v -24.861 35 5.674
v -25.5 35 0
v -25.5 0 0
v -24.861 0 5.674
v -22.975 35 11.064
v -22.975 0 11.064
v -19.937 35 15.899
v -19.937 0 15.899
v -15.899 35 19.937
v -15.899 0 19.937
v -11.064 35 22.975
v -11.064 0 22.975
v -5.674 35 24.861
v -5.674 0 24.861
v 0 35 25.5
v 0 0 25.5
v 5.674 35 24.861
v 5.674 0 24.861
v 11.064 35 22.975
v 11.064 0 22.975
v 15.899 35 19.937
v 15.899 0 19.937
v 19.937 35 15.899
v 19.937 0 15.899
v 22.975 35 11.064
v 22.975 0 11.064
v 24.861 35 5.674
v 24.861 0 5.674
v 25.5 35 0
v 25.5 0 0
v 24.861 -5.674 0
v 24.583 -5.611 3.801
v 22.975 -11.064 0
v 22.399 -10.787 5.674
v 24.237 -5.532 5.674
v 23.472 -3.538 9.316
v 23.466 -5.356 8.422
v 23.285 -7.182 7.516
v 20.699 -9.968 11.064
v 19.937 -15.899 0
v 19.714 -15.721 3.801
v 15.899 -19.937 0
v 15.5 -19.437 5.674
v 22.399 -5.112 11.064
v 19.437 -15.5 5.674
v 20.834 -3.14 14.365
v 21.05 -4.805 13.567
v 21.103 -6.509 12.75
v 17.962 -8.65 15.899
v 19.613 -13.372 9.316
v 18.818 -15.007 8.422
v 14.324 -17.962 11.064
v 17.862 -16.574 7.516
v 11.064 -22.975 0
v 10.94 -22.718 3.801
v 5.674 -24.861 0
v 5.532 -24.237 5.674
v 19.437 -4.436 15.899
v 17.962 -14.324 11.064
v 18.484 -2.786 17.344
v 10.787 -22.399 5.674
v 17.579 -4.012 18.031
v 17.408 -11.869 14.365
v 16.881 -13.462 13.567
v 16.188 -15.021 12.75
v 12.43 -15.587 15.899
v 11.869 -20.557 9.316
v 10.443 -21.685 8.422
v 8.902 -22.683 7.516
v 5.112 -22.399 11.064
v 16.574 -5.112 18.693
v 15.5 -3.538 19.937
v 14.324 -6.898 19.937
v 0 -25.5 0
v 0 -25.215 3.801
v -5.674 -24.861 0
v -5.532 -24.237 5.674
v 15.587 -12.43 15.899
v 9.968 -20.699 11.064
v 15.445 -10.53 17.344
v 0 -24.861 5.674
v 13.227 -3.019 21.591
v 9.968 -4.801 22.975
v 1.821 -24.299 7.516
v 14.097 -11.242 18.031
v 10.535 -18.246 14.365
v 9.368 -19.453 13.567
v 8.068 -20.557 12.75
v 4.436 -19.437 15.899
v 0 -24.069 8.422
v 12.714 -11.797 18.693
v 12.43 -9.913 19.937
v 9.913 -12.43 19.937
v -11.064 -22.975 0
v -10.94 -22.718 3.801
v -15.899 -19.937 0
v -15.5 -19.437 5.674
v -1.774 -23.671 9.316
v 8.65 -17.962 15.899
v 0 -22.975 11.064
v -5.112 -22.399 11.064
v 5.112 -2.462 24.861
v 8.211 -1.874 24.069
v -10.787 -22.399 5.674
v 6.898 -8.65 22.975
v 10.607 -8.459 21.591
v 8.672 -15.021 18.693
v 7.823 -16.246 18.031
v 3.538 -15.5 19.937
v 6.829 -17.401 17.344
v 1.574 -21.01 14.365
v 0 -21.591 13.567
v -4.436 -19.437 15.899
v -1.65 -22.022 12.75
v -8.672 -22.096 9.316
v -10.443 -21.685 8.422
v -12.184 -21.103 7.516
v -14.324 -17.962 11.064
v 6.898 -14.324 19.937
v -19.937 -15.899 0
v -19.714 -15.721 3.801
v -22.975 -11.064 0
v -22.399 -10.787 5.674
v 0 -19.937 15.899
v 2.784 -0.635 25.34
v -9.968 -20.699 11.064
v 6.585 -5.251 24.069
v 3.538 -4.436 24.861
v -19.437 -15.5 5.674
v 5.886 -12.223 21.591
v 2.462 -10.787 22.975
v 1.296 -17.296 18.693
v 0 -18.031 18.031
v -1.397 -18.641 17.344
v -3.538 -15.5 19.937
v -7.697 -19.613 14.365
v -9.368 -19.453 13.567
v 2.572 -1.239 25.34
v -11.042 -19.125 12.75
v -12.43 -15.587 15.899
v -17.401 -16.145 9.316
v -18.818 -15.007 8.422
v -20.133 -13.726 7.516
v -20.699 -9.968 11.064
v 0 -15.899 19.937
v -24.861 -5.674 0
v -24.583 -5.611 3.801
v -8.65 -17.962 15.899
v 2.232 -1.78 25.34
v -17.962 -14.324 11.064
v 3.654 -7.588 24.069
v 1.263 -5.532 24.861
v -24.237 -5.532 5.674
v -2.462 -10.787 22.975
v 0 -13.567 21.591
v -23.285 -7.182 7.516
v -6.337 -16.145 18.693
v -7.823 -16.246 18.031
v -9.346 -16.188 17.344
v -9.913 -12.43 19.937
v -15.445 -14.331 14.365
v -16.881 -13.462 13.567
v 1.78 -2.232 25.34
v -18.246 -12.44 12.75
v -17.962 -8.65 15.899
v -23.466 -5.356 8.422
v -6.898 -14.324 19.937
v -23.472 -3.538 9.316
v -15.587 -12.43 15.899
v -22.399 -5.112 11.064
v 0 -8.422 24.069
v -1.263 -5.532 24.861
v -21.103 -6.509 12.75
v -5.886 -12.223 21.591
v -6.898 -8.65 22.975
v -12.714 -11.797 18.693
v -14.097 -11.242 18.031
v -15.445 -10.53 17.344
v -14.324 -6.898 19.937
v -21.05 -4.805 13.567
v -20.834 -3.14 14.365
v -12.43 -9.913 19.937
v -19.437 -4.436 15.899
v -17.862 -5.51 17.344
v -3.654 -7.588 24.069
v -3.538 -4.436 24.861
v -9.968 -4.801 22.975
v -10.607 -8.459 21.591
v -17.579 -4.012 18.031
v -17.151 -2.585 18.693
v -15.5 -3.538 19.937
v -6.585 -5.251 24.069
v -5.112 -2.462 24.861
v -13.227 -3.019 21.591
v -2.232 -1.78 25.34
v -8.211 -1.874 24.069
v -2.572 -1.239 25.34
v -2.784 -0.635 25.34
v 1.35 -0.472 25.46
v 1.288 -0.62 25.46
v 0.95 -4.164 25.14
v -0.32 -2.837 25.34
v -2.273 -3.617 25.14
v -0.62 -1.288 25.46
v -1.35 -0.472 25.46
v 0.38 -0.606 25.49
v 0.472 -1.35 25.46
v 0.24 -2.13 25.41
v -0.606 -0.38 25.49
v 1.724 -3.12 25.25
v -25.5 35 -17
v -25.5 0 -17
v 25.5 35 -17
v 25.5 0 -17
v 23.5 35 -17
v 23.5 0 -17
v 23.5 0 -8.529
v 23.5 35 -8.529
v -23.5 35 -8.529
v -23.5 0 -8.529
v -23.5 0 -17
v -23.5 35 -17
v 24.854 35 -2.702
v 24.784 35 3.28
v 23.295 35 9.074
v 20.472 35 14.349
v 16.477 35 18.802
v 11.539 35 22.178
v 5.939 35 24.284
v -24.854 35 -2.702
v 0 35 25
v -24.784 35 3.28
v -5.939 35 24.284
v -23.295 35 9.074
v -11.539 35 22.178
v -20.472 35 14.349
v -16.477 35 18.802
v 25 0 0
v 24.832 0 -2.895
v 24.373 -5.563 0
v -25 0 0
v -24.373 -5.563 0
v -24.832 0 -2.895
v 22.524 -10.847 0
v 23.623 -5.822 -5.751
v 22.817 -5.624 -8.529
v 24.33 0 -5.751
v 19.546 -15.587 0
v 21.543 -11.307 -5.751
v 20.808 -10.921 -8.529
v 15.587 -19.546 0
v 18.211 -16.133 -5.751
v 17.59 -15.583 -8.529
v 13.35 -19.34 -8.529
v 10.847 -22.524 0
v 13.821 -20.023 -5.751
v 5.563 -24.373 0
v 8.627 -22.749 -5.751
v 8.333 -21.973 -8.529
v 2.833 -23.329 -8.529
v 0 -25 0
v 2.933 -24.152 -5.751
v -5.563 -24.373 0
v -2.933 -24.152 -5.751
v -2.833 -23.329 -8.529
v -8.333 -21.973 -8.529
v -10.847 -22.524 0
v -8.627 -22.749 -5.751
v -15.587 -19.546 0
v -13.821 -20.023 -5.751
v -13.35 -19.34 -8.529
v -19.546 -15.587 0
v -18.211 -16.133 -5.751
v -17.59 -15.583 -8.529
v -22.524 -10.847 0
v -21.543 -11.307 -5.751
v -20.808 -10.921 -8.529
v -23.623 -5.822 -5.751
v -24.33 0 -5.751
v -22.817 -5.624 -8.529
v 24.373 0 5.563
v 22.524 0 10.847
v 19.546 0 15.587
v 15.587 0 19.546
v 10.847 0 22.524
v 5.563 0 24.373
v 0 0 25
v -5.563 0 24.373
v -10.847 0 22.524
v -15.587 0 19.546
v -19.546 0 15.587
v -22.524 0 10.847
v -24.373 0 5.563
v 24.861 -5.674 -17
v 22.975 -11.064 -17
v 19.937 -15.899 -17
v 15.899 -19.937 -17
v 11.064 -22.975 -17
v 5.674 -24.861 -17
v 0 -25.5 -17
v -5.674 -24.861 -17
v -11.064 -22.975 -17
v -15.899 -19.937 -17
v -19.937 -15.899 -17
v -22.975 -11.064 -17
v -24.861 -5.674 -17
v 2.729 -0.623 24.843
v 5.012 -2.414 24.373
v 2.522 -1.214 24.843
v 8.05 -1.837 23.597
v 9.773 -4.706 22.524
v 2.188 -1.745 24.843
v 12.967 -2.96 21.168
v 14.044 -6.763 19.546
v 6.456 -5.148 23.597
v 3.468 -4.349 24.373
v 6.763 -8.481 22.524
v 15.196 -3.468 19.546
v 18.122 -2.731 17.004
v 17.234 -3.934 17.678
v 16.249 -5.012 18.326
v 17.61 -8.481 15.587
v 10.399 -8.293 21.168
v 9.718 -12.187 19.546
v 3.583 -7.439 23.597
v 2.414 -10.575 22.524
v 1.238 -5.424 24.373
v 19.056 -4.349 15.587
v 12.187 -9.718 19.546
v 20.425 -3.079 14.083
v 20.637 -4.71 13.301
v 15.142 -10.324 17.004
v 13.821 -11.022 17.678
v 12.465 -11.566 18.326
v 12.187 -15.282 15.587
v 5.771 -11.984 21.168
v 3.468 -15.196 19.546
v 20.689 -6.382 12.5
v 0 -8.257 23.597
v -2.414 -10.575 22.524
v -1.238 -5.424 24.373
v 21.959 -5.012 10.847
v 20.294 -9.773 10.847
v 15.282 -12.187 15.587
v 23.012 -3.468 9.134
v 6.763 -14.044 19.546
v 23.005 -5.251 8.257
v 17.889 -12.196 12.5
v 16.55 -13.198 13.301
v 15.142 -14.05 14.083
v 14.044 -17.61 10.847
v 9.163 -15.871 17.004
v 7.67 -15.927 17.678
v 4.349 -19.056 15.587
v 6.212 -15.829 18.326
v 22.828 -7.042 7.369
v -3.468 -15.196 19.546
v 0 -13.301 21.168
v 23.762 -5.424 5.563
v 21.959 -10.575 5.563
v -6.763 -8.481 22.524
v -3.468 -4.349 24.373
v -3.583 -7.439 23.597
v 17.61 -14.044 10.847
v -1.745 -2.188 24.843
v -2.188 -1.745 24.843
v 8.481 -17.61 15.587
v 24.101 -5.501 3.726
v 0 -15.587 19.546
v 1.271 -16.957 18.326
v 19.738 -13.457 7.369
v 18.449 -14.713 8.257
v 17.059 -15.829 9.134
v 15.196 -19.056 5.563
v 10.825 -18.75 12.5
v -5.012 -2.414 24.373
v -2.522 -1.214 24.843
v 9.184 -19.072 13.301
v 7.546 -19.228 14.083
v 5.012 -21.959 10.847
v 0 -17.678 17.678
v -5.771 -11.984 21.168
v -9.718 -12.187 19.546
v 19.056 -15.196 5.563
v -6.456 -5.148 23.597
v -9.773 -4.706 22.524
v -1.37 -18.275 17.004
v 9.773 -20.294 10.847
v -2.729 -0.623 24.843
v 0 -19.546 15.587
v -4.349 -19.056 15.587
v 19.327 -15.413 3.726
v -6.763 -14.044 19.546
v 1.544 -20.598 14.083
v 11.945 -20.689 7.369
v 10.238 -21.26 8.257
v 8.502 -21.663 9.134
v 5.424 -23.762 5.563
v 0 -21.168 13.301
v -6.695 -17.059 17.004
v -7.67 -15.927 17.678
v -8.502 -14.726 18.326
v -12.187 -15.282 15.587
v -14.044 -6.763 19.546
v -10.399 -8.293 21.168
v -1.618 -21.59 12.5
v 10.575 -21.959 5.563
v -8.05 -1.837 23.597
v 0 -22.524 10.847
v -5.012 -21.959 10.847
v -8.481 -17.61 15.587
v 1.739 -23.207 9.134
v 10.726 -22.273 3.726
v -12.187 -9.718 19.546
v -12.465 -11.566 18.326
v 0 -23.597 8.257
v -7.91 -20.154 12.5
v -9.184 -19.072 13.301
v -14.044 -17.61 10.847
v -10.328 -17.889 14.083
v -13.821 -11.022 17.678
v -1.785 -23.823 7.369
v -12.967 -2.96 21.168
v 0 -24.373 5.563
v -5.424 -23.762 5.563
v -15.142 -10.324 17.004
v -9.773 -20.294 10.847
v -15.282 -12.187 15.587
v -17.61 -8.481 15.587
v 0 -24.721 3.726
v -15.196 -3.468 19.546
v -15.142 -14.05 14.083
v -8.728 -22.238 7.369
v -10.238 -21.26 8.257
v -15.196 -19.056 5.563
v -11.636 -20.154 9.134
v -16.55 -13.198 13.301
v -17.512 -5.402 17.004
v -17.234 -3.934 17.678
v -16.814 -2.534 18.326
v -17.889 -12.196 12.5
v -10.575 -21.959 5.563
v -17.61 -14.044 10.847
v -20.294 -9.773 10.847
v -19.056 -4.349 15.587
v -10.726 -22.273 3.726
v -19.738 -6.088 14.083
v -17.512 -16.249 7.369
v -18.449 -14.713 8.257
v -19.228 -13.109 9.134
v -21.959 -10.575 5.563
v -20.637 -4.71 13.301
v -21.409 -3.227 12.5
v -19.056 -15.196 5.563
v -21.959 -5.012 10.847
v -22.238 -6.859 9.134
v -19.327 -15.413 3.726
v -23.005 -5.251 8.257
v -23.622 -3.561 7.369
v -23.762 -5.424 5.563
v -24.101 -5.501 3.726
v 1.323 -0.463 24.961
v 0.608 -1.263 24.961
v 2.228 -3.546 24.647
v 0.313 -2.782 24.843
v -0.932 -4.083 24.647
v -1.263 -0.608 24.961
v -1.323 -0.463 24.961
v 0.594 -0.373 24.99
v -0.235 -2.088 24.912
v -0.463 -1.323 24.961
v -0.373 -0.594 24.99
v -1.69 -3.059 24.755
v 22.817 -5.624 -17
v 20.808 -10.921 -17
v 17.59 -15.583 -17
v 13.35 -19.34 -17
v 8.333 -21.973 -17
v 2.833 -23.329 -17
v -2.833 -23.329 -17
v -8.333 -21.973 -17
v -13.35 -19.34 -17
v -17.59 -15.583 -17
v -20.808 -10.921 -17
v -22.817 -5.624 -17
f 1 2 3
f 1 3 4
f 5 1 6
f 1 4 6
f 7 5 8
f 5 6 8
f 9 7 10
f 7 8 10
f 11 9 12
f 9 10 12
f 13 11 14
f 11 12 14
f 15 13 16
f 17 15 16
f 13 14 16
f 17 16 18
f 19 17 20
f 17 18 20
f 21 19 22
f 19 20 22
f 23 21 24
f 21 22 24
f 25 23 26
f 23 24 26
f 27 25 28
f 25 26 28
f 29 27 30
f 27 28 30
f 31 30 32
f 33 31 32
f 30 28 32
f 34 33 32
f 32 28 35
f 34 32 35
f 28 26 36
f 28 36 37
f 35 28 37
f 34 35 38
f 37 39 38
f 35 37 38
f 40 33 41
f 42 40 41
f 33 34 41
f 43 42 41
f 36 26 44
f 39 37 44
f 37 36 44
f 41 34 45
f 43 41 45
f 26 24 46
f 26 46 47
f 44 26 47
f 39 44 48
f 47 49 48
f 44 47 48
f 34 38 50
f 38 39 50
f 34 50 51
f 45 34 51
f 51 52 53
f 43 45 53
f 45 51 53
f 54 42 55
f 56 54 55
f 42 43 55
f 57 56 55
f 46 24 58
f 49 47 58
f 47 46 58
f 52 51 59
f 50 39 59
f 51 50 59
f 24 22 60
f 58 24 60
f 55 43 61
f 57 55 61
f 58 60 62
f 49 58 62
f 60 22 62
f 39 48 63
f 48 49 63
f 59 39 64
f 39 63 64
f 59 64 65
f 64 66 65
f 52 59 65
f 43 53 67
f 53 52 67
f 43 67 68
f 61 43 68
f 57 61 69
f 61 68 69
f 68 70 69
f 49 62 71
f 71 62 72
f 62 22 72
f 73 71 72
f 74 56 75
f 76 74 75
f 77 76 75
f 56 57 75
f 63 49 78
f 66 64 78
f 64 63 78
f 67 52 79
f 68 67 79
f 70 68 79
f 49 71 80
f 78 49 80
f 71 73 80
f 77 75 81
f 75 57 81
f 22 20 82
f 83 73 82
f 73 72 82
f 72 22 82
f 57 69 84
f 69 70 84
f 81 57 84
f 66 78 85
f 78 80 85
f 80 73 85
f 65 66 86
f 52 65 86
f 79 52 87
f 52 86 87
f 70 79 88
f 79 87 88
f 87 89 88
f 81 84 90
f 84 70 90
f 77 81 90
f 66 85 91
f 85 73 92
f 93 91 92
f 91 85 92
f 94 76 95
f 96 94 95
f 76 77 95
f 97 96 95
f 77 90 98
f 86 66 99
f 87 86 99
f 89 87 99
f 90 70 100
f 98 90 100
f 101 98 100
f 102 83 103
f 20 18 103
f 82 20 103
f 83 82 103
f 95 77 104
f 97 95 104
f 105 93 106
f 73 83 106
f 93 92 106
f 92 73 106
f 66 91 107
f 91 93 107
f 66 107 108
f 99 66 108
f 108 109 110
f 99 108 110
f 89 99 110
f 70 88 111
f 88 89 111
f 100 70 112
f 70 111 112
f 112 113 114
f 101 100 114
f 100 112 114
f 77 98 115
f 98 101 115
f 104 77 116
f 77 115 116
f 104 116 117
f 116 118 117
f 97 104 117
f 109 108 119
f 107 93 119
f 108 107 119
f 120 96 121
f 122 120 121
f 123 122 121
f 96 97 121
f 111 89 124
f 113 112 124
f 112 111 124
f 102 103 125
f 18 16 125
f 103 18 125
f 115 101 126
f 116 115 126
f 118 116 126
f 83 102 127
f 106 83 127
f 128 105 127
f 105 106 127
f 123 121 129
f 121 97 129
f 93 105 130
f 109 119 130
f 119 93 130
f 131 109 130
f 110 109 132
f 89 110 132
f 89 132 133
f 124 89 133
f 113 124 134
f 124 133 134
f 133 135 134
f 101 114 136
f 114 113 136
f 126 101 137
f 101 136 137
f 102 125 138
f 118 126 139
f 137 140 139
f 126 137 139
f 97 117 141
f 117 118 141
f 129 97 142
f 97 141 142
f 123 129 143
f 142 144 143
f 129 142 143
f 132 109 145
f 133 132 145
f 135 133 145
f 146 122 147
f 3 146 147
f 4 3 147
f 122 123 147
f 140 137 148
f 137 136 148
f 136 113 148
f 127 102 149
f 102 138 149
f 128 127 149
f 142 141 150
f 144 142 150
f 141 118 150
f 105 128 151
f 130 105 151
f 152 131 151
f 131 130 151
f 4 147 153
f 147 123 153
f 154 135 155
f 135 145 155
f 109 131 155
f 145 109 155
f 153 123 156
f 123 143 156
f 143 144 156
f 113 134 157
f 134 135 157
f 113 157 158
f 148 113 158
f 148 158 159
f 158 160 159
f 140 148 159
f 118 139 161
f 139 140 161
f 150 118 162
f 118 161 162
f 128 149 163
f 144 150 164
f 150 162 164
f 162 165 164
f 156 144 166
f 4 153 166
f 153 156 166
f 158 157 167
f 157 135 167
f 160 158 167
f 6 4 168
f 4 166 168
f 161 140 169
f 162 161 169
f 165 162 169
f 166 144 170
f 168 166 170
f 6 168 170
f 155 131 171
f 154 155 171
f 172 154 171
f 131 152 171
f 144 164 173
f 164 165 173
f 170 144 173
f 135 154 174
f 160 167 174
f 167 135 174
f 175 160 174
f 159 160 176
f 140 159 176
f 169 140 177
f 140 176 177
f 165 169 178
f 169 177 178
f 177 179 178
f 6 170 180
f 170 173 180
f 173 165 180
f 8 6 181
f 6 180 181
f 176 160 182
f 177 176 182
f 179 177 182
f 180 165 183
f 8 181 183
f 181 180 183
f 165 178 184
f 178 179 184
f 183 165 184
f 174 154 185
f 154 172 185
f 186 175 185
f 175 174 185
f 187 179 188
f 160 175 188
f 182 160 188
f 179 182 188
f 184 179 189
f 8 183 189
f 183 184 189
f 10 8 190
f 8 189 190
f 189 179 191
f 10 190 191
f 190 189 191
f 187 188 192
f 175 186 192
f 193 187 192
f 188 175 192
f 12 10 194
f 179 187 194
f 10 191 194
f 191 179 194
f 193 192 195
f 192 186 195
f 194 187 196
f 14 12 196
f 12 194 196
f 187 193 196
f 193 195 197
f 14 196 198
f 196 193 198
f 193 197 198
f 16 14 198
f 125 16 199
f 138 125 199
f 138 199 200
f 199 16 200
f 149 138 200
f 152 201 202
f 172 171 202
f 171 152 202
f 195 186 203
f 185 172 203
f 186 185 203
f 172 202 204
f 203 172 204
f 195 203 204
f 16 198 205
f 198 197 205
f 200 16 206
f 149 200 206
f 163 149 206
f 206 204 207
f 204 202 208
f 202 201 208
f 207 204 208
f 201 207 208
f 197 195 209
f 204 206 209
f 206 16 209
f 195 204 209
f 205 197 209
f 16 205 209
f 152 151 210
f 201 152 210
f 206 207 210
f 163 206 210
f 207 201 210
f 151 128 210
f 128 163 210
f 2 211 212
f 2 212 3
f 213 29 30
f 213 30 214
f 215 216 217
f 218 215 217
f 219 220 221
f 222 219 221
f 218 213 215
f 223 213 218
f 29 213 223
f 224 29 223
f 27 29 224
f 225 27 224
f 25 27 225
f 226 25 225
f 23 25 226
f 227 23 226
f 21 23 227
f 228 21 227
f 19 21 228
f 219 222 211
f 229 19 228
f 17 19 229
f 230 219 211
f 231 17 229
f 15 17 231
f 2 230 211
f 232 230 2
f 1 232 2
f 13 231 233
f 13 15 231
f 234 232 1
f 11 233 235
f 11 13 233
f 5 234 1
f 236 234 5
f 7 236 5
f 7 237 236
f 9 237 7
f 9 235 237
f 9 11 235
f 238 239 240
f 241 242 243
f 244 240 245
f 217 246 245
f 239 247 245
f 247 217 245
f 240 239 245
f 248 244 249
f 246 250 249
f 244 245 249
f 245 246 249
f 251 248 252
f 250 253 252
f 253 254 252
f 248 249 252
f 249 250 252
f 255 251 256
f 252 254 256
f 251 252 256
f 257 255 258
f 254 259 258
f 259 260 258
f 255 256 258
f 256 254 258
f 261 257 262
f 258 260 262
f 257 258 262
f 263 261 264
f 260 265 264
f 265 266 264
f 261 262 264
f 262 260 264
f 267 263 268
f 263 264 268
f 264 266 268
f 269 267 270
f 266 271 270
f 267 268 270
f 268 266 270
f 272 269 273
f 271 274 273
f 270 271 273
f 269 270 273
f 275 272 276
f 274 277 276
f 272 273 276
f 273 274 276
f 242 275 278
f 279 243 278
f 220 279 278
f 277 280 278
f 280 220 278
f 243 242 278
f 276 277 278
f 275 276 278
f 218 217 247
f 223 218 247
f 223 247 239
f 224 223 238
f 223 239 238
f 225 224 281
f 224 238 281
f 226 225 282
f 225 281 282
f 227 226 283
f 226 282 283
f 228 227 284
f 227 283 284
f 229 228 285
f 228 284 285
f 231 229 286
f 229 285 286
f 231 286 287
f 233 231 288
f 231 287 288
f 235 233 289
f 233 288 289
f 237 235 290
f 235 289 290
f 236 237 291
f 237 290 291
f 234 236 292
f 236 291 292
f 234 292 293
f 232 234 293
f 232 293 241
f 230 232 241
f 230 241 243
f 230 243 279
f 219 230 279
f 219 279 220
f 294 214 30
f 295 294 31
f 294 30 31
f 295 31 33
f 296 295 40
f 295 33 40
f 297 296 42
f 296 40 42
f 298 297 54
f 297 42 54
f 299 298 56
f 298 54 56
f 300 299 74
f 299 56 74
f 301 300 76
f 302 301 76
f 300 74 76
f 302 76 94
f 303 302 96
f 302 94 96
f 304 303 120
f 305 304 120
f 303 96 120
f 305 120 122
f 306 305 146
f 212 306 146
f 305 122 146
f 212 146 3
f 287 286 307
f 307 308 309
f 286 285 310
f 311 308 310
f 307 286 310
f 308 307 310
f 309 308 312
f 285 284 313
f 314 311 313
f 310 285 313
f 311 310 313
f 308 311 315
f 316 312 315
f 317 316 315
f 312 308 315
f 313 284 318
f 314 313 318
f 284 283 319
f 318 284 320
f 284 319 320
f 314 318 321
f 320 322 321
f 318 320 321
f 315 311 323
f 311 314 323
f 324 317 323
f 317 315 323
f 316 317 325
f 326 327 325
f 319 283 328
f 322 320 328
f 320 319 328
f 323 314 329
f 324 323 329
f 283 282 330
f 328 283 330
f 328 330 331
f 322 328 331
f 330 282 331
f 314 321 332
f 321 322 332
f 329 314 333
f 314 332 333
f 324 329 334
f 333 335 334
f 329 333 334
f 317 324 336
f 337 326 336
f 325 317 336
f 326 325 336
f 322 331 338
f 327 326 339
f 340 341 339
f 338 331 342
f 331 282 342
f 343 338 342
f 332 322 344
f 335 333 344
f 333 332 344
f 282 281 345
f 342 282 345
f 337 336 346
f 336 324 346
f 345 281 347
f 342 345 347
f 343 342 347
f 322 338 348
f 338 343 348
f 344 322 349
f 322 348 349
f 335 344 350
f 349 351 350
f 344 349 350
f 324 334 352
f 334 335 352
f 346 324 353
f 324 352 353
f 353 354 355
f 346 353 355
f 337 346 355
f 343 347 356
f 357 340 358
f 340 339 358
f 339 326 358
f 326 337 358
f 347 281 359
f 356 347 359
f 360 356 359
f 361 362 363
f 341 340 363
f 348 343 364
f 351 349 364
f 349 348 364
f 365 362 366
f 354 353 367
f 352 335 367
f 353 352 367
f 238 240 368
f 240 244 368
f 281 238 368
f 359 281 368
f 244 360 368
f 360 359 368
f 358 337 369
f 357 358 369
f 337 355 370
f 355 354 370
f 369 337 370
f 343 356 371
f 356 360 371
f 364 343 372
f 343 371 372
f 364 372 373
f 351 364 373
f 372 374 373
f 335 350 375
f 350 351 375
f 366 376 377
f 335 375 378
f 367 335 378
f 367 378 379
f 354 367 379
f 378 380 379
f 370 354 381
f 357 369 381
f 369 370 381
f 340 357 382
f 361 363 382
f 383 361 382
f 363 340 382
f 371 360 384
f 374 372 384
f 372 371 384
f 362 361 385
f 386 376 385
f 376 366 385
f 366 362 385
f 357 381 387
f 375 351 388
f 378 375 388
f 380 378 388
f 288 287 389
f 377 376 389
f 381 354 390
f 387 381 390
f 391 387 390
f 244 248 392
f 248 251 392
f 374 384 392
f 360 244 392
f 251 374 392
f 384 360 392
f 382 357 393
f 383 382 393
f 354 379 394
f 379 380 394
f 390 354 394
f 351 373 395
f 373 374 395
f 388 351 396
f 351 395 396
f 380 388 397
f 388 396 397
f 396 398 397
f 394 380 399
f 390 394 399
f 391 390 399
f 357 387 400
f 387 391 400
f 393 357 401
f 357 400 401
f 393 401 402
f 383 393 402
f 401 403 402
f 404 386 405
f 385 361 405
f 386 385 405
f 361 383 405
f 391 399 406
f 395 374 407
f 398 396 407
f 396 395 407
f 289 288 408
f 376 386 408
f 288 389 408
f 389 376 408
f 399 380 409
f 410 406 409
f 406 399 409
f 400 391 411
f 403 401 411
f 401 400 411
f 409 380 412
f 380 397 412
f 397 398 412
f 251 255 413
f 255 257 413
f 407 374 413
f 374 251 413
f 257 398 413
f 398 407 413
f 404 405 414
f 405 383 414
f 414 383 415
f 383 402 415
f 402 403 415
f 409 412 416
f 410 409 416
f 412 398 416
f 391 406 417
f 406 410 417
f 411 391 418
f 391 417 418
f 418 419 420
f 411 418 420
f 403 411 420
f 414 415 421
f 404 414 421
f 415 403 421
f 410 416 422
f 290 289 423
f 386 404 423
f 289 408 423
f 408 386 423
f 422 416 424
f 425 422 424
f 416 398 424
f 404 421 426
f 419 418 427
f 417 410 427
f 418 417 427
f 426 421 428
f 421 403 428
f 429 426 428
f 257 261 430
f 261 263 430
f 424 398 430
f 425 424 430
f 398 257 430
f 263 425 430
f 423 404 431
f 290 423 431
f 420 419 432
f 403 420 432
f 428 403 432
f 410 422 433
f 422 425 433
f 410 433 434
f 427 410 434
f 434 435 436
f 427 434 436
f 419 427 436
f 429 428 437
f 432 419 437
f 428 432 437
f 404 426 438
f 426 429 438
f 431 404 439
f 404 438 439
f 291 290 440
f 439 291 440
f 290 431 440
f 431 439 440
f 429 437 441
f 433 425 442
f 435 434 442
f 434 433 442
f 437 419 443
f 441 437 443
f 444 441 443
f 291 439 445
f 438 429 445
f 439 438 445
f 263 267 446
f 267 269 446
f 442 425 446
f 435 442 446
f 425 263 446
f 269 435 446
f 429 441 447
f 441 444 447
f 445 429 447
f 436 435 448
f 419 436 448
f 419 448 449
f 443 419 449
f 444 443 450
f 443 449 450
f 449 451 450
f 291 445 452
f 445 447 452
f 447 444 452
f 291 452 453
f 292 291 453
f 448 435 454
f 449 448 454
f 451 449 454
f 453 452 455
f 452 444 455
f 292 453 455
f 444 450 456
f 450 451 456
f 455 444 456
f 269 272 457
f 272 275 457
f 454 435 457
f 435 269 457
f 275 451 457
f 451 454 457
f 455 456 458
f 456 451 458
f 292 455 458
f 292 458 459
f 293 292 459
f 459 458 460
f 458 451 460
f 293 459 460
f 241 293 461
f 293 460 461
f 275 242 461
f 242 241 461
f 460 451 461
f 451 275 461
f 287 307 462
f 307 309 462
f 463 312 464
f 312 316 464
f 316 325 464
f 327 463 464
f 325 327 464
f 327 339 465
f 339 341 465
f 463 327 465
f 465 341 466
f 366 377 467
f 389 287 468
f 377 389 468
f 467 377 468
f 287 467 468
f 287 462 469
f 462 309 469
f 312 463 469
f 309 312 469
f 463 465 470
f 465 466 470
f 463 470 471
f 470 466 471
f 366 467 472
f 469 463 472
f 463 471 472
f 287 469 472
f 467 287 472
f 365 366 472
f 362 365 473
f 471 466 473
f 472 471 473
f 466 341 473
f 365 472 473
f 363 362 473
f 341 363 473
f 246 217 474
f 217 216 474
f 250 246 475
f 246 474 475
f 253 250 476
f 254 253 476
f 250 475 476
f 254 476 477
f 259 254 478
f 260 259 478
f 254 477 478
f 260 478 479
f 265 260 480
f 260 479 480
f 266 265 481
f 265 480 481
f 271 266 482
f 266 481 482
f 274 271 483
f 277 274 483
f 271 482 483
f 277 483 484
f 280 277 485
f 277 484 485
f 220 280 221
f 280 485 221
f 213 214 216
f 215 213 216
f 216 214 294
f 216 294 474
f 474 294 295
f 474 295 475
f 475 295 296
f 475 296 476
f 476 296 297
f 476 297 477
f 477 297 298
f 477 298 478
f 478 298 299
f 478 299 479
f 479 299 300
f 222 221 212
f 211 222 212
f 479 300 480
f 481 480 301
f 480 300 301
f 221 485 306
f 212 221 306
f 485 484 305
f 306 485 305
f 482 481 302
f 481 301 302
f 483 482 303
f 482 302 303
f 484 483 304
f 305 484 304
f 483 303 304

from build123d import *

# Parameters (mm, degrees)
F1_ANGLE = 180
F3_DEPTH = 35


with BuildPart() as f1:
    # F0 (on Front) → F1 (revolve)
    with BuildSketch(Plane.XZ):
        with BuildLine():
            ThreePointArc((0, 25), (17.67767, 17.67767), (25, 0))
            Line((25, 0), (25.5, 0))
            ThreePointArc((25.5, 0), (18.031223, 18.031223), (0, 25.5))
            Line((0, 25.5), (0, 25))
        make_face()
        with BuildLine():
            Line((25.5, 0), (25, 0))
            ThreePointArc((25, 0), (24.622145, -4.330127), (23.5, -8.529361))
            Line((23.5, -8.529361), (23.5, -17))
            Line((23.5, -17), (25.5, -17))
            Line((25.5, -17), (25.5, 0))
        make_face()
    revolve(axis=Axis((0, 0, 9.860388), (0, 0, -1)), revolution_arc=F1_ANGLE)

    # F2 (on face) → F3 (join)
    with BuildSketch(Plane(origin=(0, 0, 0), x_dir=(-1, 0, 0), z_dir=(0, 1, 0))):
        with BuildLine():
            ThreePointArc((25.5, 0), (0, 25.5), (-25.5, 0))
            Line((-25.5, 0), (-25.5, -17))
            Line((-25.5, -17), (-23.5, -17))
            Line((-23.5, -17), (-23.5, -8.529361))
            ThreePointArc((-23.5, -8.529361), (0, 25), (23.5, -8.529361))
            Line((23.5, -8.529361), (23.5, -17))
            Line((23.5, -17), (25.5, -17))
            Line((25.5, -17), (25.5, 0))
        make_face()
    extrude(amount=F3_DEPTH)


solid = f1.part
